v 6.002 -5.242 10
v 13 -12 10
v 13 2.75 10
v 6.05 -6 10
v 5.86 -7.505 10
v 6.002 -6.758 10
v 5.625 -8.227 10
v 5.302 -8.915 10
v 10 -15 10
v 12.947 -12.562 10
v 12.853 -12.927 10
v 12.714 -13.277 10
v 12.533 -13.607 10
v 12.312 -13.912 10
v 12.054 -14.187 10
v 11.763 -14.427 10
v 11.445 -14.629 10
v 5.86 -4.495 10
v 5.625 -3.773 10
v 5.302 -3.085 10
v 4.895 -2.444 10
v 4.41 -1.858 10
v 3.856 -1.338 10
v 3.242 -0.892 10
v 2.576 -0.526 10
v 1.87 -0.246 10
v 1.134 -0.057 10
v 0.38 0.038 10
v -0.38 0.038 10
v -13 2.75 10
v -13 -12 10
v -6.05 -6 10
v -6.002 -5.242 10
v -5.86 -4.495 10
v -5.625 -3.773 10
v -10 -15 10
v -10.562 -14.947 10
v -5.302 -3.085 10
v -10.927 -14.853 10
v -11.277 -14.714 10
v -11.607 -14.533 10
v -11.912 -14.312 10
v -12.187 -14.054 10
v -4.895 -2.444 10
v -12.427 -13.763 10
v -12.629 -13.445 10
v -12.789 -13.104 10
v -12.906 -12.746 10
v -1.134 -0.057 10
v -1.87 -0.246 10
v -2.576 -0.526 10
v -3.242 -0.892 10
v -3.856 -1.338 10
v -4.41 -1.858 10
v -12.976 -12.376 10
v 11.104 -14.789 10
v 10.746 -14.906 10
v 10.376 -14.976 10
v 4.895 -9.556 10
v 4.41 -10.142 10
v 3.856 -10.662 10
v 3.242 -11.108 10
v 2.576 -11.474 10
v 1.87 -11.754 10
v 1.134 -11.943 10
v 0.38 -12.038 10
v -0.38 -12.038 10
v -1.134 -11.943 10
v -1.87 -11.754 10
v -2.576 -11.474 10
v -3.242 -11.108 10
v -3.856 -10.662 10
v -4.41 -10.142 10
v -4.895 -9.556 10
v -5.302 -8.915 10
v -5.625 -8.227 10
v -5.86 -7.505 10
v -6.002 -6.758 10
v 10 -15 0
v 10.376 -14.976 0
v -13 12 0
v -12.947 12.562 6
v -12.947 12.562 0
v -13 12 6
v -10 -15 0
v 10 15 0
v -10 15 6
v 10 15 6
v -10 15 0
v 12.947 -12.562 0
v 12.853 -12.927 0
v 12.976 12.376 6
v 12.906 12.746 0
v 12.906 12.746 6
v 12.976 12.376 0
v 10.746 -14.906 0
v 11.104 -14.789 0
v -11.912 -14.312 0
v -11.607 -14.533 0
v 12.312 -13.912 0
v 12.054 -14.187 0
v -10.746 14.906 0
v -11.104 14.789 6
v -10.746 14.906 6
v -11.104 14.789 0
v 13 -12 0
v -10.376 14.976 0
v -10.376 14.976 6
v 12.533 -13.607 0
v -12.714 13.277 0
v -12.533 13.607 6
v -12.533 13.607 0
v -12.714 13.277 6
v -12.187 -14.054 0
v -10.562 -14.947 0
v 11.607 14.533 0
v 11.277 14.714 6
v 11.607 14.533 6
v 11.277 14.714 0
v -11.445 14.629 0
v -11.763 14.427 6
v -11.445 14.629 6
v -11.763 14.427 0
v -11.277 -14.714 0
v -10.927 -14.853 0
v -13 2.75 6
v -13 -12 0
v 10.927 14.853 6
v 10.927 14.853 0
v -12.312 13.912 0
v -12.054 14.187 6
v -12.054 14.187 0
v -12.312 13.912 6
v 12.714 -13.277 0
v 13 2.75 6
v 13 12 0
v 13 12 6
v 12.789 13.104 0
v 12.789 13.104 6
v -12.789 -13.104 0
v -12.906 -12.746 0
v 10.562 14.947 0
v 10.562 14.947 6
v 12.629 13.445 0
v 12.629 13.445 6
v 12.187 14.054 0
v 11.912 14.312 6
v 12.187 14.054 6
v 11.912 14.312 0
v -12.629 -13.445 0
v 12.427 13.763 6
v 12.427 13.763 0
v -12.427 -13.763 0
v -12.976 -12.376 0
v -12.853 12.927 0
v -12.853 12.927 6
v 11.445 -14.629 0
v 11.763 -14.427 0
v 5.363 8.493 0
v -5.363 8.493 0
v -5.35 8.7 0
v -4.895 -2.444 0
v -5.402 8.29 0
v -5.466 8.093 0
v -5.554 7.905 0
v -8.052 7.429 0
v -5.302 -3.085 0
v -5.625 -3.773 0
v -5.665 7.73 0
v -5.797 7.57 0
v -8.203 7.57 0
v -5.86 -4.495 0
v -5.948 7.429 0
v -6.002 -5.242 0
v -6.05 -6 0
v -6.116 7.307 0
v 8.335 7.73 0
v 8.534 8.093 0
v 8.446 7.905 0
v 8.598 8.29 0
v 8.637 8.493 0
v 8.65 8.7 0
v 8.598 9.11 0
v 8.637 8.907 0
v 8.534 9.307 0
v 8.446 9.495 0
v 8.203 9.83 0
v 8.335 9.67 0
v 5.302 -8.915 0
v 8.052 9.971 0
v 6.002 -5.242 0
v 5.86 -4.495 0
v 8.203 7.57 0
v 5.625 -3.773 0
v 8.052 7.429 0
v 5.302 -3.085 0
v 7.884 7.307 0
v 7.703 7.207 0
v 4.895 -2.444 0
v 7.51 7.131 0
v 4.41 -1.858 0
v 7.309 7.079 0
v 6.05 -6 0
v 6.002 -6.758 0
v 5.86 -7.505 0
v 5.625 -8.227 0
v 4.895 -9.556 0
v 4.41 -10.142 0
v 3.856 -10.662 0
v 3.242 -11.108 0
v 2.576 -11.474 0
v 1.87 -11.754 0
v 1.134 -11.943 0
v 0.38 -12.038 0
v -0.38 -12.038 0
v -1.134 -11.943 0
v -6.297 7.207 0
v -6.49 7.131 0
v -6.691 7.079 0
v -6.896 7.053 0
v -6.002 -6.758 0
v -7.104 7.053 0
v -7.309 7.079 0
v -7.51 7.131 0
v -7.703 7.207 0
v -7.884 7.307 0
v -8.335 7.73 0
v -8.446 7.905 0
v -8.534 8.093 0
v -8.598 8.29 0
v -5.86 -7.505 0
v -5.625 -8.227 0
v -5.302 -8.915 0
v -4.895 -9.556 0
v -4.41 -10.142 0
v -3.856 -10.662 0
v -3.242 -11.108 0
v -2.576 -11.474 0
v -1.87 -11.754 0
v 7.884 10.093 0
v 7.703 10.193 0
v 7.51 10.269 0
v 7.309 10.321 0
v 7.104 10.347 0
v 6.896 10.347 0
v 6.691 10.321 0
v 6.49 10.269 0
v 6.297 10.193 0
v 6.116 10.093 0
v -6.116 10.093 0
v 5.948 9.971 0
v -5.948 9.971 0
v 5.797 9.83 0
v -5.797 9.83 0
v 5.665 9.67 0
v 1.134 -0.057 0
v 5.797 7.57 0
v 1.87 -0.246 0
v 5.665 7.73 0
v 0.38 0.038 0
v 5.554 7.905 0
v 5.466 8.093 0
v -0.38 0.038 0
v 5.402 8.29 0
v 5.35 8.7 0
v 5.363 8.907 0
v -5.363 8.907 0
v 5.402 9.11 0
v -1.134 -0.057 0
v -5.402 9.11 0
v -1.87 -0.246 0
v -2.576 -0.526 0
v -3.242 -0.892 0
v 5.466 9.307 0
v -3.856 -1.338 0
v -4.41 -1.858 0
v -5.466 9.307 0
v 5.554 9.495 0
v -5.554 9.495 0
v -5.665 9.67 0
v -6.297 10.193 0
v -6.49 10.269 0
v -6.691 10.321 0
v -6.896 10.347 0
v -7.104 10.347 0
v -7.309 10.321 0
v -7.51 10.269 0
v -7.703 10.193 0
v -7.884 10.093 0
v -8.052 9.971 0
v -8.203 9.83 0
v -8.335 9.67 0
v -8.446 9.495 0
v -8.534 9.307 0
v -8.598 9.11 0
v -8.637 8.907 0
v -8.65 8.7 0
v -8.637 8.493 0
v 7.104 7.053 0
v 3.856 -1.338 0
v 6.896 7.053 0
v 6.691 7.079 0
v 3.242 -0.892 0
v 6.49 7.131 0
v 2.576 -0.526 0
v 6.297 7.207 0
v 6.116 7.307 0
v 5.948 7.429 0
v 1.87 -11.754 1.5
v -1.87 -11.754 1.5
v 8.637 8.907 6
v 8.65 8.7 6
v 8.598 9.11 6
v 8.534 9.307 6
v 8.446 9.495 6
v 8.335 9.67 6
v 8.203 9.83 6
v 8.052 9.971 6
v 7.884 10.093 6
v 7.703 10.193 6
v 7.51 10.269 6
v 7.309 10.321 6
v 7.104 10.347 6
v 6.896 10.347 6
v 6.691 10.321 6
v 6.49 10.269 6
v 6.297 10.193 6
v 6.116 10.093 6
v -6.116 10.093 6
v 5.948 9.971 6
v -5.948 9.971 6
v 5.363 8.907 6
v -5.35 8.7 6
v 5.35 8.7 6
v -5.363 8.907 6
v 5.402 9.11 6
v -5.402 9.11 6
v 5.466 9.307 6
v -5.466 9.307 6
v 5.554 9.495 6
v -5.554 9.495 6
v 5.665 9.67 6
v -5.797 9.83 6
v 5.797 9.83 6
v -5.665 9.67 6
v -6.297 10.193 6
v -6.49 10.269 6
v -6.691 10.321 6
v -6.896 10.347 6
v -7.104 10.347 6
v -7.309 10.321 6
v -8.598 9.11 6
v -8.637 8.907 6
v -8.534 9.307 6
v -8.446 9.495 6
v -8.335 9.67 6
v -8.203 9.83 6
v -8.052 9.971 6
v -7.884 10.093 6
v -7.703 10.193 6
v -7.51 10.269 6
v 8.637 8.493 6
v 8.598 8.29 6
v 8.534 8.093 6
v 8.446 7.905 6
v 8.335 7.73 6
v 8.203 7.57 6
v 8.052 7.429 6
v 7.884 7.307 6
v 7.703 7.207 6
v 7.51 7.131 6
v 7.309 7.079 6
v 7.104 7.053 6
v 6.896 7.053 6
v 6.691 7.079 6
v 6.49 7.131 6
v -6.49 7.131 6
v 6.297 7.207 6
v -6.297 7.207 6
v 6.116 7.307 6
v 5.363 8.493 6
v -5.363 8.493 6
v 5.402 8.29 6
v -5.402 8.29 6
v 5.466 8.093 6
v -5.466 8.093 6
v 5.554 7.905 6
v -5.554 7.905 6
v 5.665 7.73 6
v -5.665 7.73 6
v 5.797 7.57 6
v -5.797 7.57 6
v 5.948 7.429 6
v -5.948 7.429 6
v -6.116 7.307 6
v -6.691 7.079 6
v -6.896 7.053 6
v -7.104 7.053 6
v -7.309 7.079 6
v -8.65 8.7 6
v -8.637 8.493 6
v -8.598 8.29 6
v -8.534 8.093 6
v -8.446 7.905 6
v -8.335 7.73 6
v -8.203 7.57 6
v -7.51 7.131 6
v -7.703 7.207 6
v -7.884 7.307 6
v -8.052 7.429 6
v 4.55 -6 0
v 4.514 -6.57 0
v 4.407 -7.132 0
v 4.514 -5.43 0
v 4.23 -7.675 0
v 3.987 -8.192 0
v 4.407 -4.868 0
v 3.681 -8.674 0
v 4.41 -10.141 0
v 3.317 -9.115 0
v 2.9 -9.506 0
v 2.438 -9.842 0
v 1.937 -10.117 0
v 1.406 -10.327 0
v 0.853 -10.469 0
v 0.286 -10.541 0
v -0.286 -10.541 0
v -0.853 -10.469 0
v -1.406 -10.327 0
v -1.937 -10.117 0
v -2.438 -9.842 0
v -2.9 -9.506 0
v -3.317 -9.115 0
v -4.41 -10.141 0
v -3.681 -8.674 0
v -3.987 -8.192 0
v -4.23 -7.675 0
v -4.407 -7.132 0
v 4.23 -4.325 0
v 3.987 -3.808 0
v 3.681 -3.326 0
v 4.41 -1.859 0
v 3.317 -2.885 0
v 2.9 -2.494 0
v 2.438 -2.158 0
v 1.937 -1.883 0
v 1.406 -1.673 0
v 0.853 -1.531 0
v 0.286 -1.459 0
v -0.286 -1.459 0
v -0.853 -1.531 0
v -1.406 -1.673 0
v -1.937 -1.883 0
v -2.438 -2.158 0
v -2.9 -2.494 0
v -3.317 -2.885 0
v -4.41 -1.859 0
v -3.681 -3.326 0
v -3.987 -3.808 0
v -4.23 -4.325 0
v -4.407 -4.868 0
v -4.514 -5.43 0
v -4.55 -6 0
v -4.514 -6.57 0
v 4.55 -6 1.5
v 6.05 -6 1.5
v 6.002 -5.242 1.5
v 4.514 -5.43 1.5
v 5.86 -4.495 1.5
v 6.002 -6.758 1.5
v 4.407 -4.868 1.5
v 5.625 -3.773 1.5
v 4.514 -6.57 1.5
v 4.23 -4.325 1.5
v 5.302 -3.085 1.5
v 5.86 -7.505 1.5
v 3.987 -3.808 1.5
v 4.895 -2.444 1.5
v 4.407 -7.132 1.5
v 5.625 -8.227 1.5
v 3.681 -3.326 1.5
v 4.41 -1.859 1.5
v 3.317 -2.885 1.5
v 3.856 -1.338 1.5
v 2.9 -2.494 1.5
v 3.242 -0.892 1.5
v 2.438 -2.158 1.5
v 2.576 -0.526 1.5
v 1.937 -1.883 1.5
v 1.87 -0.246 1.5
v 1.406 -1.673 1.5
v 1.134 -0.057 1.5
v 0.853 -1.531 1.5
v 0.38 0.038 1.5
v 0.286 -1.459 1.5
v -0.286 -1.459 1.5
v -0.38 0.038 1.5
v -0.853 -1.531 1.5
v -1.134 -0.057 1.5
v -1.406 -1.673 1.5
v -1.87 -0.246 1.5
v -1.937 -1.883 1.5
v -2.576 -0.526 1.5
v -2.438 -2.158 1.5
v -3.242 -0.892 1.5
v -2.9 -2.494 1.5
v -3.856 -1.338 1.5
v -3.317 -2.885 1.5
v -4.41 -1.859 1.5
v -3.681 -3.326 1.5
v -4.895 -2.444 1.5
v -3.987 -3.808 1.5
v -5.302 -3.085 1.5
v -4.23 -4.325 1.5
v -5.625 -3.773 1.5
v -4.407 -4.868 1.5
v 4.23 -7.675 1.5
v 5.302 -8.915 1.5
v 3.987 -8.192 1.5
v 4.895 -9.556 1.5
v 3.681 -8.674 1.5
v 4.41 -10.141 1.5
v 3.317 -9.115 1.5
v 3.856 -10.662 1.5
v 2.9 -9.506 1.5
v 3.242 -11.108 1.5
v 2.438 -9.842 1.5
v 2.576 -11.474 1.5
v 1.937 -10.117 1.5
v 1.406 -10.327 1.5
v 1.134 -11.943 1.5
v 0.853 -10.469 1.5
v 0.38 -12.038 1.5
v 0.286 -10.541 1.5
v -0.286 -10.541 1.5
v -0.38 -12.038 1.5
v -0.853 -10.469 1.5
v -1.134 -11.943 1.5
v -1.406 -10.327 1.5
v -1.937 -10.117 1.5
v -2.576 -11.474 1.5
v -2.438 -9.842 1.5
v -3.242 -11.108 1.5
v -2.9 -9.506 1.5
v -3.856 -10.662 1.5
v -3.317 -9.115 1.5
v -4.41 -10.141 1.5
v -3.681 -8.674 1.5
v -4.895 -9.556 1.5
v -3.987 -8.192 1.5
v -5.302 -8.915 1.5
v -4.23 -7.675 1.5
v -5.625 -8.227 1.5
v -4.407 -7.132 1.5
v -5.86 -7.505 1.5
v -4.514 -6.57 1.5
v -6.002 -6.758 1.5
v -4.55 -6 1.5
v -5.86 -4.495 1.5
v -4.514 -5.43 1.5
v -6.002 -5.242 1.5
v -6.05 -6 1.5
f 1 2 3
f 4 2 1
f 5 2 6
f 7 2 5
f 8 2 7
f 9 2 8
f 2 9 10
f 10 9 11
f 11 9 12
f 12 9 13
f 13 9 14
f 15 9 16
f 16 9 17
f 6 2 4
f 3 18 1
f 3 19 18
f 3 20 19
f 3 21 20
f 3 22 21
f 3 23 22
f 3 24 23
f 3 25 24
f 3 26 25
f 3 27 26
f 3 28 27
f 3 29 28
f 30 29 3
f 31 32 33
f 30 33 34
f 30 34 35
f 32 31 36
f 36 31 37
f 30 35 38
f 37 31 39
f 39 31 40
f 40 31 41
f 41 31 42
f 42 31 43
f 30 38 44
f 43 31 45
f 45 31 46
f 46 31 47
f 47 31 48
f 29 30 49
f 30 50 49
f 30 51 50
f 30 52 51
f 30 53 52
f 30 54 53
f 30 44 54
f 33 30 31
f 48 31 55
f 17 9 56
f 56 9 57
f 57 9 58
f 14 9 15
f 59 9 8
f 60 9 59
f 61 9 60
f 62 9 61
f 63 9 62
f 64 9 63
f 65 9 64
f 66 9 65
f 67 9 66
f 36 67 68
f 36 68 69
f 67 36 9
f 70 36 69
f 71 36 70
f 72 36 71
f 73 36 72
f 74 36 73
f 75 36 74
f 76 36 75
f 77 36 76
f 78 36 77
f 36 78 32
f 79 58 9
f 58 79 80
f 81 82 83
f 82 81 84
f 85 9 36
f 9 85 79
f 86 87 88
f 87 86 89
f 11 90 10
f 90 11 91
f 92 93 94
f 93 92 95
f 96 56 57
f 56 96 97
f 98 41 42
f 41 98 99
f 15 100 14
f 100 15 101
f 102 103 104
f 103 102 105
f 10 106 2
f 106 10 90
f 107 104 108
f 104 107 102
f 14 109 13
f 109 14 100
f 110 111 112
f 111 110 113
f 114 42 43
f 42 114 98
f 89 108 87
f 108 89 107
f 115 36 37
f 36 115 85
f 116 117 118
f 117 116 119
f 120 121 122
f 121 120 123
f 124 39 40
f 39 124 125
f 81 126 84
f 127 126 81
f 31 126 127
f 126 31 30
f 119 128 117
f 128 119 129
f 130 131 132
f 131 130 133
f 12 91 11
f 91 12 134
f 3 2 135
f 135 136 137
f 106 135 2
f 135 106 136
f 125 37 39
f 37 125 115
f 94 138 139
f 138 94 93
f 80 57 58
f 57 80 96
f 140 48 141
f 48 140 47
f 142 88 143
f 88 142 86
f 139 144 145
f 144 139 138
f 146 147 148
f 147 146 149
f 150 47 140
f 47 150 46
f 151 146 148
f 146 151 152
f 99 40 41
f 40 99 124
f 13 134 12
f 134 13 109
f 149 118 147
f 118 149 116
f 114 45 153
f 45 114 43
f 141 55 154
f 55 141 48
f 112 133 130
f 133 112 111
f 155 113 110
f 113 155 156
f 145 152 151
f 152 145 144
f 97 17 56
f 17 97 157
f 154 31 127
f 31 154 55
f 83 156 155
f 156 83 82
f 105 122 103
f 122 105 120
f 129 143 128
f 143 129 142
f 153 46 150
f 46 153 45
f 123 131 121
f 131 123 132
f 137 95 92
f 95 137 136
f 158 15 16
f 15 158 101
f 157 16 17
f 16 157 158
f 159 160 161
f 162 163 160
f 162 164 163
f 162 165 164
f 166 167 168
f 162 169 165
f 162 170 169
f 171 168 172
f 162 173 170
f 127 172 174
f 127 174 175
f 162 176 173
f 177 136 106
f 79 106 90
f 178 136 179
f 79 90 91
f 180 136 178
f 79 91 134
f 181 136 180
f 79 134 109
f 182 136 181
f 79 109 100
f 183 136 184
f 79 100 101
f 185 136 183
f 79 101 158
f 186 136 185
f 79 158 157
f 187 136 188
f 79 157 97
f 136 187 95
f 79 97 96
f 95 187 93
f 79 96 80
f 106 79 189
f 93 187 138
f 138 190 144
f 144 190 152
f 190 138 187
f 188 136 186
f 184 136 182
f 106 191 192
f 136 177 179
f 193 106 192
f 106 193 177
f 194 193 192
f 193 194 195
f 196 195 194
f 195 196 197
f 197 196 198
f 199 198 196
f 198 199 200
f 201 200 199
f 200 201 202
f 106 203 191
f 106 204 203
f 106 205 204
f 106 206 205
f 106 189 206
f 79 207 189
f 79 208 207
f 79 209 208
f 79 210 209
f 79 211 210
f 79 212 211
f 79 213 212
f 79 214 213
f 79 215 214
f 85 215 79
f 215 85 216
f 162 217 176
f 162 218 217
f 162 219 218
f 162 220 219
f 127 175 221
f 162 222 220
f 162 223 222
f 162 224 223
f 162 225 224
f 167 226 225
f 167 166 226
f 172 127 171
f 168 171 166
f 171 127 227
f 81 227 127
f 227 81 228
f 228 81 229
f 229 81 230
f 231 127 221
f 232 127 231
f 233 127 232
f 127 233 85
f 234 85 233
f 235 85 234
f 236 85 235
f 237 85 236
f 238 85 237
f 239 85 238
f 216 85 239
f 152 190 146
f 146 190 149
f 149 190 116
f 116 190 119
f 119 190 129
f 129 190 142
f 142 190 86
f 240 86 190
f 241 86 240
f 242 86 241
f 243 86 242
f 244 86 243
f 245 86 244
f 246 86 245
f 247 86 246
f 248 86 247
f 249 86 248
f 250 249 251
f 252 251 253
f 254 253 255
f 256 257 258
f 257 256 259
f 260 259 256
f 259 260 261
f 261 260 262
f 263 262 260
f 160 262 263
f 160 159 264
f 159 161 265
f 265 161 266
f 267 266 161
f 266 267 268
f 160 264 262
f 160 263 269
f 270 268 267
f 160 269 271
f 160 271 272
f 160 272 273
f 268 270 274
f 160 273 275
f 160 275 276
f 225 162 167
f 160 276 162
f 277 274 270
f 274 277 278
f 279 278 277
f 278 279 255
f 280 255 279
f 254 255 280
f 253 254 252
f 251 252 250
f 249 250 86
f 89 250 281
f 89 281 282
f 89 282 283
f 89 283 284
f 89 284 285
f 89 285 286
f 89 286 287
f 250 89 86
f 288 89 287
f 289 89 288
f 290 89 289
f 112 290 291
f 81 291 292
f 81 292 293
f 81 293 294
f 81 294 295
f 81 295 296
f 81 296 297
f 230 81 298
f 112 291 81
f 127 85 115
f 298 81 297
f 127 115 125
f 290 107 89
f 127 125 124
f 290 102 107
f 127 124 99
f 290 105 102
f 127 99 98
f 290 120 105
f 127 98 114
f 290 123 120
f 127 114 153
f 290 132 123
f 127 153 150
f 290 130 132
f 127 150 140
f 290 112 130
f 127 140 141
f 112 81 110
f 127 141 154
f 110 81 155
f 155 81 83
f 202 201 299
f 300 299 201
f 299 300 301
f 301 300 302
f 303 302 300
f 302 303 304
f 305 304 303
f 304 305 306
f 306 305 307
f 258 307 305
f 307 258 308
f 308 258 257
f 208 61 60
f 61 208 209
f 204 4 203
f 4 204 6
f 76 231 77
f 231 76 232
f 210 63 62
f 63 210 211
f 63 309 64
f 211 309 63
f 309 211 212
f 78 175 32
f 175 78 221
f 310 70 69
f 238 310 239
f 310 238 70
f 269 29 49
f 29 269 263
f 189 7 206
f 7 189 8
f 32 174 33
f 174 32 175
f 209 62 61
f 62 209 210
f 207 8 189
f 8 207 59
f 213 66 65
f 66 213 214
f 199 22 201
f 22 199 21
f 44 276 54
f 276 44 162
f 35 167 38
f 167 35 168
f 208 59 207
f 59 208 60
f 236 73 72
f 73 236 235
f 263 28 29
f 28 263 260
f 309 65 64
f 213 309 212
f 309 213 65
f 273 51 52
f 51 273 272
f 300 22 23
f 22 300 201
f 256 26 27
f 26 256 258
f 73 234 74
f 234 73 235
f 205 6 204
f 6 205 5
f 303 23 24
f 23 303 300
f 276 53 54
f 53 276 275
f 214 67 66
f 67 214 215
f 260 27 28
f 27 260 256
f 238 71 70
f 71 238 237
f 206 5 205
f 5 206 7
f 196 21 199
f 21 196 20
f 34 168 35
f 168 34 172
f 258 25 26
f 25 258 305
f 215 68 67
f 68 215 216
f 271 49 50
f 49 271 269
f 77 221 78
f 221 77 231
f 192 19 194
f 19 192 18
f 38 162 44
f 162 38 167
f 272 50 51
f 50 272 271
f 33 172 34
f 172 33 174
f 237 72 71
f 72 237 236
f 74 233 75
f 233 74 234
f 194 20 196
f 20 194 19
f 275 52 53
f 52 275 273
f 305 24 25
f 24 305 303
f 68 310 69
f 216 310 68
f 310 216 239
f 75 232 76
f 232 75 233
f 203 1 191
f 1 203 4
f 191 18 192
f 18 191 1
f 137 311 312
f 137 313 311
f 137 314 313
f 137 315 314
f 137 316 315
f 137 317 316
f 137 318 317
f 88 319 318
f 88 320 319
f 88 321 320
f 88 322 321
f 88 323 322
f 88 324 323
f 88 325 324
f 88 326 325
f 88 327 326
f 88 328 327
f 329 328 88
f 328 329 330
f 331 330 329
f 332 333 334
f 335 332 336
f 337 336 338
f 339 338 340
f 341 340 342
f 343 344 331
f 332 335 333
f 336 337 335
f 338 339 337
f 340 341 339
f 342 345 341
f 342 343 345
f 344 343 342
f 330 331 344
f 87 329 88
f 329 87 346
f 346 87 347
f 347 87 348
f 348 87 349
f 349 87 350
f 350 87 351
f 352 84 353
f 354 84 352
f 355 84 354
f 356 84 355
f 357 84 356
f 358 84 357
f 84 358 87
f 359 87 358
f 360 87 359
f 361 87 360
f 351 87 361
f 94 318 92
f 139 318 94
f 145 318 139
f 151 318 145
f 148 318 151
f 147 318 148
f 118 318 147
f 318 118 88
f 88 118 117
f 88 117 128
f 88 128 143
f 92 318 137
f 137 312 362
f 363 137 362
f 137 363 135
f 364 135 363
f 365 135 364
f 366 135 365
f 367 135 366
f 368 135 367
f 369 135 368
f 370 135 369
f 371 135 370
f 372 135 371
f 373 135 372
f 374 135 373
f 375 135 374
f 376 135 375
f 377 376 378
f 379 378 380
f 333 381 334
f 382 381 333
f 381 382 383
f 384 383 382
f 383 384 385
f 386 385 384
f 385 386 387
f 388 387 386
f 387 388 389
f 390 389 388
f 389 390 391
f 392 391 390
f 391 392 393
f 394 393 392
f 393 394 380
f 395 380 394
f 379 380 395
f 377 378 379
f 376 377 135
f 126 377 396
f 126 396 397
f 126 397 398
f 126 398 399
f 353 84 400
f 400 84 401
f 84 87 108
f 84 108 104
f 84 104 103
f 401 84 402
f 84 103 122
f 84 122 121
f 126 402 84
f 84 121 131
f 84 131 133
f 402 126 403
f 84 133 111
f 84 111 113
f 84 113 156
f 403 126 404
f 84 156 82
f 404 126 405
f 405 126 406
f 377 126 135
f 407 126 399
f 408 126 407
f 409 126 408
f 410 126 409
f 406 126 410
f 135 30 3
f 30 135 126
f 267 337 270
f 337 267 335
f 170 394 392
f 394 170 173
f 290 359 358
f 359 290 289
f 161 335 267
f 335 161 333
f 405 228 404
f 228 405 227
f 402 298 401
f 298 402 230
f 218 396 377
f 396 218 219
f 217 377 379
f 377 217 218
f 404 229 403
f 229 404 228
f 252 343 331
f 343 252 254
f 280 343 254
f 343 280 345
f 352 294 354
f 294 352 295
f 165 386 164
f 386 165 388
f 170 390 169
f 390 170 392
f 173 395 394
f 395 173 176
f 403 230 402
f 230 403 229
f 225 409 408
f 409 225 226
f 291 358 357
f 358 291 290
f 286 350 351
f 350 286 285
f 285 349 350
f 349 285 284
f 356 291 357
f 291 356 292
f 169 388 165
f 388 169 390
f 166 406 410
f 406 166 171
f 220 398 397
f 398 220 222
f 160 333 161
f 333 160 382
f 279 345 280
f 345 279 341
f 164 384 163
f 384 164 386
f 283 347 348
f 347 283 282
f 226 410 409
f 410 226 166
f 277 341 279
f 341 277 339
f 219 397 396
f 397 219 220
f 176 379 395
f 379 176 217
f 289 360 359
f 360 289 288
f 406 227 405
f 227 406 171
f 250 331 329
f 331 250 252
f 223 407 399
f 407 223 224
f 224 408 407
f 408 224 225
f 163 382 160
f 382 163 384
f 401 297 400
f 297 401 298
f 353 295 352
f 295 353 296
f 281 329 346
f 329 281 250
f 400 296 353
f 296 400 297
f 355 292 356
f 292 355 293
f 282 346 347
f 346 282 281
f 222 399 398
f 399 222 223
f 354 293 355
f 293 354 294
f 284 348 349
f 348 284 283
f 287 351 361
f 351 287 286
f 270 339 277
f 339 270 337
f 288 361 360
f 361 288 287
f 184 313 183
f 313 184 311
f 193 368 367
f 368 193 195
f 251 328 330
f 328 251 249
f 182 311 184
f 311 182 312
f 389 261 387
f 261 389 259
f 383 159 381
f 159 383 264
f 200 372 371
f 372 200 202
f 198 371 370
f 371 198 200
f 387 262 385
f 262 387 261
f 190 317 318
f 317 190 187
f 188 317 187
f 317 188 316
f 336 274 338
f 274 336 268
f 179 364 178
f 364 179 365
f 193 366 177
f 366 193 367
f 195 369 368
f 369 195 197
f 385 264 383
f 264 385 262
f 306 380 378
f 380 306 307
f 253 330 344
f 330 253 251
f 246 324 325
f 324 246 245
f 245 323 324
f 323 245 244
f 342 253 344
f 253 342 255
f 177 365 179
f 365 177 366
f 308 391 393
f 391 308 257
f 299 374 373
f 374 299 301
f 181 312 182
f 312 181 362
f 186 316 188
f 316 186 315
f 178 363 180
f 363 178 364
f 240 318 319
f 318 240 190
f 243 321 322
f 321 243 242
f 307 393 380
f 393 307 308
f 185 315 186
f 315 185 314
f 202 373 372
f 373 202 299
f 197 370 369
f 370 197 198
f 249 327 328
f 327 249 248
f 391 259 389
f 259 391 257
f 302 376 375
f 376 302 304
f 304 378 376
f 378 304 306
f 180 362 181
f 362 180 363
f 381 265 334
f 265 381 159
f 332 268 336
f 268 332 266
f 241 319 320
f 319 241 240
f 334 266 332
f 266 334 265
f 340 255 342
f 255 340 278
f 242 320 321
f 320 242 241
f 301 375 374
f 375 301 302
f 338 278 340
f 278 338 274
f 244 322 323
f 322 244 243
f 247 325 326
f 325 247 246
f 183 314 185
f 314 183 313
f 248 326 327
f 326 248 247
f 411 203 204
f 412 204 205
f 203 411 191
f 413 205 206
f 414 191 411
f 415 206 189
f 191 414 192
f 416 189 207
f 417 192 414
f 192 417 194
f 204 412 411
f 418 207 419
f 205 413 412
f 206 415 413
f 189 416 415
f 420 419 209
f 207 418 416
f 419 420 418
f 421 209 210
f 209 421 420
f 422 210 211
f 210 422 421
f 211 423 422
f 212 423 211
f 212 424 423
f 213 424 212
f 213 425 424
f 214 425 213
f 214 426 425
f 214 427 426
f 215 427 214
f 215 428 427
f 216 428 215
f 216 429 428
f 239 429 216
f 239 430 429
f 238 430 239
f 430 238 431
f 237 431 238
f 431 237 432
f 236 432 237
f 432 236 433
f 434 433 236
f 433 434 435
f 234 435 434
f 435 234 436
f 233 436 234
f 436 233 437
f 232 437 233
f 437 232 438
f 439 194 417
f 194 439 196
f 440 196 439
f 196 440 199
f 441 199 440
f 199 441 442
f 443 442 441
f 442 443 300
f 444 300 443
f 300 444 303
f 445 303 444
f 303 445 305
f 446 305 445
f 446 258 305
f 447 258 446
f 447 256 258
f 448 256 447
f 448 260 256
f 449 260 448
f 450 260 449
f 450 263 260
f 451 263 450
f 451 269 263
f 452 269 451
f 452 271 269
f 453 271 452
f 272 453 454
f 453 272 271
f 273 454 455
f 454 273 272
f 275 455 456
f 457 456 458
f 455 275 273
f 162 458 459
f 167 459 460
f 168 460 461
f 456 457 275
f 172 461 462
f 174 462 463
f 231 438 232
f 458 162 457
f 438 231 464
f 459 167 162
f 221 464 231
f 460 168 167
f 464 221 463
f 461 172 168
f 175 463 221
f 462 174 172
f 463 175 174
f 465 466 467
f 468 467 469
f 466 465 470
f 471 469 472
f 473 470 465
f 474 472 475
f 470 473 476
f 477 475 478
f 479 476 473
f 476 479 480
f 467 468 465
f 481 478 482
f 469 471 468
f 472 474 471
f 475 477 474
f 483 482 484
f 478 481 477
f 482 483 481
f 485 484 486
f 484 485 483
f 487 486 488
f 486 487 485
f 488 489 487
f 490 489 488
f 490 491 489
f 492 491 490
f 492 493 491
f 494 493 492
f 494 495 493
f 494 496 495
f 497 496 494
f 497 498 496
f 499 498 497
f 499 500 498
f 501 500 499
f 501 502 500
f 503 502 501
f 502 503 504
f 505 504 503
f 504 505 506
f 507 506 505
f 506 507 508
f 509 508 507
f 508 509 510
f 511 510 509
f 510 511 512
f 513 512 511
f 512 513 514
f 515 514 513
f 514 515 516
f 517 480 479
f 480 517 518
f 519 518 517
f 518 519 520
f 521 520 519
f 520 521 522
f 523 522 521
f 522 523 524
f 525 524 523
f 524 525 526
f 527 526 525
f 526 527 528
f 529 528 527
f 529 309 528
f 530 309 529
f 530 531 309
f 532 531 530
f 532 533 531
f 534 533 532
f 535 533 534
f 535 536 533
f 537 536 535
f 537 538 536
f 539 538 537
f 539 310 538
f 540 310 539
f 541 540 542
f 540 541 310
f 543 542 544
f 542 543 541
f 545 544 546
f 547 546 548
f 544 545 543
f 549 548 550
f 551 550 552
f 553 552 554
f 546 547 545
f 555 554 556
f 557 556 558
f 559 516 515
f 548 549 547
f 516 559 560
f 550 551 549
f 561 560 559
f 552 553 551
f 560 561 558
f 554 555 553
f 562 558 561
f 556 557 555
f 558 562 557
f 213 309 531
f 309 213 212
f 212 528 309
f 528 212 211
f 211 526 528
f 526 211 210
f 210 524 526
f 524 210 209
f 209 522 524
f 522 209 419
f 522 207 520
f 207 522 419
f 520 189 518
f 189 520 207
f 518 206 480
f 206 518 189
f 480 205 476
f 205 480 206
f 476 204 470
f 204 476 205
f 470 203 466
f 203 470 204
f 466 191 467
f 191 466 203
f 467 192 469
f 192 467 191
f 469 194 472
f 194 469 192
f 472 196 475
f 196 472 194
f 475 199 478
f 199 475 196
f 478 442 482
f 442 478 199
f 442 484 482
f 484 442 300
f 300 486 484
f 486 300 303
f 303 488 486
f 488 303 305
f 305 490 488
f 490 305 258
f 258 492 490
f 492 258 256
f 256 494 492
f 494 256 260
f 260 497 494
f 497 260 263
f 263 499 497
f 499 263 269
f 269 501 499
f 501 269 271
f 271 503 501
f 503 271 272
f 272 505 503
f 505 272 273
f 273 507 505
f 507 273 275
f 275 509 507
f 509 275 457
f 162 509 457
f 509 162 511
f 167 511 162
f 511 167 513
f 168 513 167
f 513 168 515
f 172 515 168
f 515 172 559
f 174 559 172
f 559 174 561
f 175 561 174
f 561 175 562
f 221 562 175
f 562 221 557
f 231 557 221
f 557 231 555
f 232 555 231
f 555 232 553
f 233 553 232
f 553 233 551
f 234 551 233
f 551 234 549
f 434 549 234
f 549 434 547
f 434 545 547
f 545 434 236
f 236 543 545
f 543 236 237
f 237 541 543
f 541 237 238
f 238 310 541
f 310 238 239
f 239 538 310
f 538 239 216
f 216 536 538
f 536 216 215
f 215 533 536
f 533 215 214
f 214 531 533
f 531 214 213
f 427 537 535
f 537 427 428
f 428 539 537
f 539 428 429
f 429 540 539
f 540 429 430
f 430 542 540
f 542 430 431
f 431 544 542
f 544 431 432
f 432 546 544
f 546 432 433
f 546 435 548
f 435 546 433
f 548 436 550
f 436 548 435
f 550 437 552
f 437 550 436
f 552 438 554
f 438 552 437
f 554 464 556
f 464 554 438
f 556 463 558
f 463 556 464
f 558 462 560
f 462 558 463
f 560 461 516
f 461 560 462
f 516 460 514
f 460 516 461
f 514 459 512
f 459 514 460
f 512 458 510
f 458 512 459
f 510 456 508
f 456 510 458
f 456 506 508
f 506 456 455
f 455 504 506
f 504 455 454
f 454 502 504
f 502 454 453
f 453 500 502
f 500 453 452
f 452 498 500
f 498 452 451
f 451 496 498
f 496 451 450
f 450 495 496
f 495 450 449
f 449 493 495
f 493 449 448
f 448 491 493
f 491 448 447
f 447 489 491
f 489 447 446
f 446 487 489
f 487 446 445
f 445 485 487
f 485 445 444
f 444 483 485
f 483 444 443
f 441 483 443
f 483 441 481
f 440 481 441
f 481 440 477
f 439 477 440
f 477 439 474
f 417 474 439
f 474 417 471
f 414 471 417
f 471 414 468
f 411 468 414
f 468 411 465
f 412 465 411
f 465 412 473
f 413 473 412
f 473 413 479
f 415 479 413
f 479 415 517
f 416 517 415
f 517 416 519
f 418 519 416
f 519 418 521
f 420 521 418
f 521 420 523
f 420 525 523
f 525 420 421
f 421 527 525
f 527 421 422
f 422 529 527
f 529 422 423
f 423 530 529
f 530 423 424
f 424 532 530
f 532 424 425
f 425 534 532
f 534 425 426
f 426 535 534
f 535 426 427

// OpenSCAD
$fn=50;
width = 26;
length = 30;
height = 10;
shelf_height = 2;
shelf_length = 12;
bearing_hole_diameter = 12.1;
bearing_hole_offset = -6;
screw_size = 3.3;
screw_spacing = 14;

module fillet(r) {
   offset(r = r) {
     offset(r = -r) {
       children();
     }
   }
}


module shelf_cutout() {
    translate([0, (length / 2) - (shelf_length / 2), height/2 + shelf_height/2]){
        linear_extrude(height - shelf_height + 0.5) {
            square([width + 0.5, shelf_length + 0.5], center=true);
        }
    }
}

module screw_hole(x, y, d) {
    translate([x, y, -0.5]){
        linear_extrude(height + 1) {
            circle(d=d);
        }
    }
}

module outer_shell() {
    linear_extrude(height) {
        fillet(3) {
            square([width, length], center=true);
        }
    }
}


module bearing_hole() {
    translate([0, bearing_hole_offset, -1]) {
        linear_extrude(height + 2) {
            circle(d=bearing_hole_diameter);
        }
    }
}

module bearing_stop() {
    translate([0, bearing_hole_offset, 0]) {
        linear_extrude(1.5) {
            difference() {
                circle(d=bearing_hole_diameter);
                circle(d=bearing_hole_diameter - 3);
            }
        }
    }
}


union() {
    difference() {
        outer_shell();
        bearing_hole();
        shelf_cutout();
        screw_hole(-screw_spacing/2, shelf_length - screw_size, screw_size);
        screw_hole(screw_spacing/2, shelf_length - screw_size, screw_size);
    }
    bearing_stop();
}
